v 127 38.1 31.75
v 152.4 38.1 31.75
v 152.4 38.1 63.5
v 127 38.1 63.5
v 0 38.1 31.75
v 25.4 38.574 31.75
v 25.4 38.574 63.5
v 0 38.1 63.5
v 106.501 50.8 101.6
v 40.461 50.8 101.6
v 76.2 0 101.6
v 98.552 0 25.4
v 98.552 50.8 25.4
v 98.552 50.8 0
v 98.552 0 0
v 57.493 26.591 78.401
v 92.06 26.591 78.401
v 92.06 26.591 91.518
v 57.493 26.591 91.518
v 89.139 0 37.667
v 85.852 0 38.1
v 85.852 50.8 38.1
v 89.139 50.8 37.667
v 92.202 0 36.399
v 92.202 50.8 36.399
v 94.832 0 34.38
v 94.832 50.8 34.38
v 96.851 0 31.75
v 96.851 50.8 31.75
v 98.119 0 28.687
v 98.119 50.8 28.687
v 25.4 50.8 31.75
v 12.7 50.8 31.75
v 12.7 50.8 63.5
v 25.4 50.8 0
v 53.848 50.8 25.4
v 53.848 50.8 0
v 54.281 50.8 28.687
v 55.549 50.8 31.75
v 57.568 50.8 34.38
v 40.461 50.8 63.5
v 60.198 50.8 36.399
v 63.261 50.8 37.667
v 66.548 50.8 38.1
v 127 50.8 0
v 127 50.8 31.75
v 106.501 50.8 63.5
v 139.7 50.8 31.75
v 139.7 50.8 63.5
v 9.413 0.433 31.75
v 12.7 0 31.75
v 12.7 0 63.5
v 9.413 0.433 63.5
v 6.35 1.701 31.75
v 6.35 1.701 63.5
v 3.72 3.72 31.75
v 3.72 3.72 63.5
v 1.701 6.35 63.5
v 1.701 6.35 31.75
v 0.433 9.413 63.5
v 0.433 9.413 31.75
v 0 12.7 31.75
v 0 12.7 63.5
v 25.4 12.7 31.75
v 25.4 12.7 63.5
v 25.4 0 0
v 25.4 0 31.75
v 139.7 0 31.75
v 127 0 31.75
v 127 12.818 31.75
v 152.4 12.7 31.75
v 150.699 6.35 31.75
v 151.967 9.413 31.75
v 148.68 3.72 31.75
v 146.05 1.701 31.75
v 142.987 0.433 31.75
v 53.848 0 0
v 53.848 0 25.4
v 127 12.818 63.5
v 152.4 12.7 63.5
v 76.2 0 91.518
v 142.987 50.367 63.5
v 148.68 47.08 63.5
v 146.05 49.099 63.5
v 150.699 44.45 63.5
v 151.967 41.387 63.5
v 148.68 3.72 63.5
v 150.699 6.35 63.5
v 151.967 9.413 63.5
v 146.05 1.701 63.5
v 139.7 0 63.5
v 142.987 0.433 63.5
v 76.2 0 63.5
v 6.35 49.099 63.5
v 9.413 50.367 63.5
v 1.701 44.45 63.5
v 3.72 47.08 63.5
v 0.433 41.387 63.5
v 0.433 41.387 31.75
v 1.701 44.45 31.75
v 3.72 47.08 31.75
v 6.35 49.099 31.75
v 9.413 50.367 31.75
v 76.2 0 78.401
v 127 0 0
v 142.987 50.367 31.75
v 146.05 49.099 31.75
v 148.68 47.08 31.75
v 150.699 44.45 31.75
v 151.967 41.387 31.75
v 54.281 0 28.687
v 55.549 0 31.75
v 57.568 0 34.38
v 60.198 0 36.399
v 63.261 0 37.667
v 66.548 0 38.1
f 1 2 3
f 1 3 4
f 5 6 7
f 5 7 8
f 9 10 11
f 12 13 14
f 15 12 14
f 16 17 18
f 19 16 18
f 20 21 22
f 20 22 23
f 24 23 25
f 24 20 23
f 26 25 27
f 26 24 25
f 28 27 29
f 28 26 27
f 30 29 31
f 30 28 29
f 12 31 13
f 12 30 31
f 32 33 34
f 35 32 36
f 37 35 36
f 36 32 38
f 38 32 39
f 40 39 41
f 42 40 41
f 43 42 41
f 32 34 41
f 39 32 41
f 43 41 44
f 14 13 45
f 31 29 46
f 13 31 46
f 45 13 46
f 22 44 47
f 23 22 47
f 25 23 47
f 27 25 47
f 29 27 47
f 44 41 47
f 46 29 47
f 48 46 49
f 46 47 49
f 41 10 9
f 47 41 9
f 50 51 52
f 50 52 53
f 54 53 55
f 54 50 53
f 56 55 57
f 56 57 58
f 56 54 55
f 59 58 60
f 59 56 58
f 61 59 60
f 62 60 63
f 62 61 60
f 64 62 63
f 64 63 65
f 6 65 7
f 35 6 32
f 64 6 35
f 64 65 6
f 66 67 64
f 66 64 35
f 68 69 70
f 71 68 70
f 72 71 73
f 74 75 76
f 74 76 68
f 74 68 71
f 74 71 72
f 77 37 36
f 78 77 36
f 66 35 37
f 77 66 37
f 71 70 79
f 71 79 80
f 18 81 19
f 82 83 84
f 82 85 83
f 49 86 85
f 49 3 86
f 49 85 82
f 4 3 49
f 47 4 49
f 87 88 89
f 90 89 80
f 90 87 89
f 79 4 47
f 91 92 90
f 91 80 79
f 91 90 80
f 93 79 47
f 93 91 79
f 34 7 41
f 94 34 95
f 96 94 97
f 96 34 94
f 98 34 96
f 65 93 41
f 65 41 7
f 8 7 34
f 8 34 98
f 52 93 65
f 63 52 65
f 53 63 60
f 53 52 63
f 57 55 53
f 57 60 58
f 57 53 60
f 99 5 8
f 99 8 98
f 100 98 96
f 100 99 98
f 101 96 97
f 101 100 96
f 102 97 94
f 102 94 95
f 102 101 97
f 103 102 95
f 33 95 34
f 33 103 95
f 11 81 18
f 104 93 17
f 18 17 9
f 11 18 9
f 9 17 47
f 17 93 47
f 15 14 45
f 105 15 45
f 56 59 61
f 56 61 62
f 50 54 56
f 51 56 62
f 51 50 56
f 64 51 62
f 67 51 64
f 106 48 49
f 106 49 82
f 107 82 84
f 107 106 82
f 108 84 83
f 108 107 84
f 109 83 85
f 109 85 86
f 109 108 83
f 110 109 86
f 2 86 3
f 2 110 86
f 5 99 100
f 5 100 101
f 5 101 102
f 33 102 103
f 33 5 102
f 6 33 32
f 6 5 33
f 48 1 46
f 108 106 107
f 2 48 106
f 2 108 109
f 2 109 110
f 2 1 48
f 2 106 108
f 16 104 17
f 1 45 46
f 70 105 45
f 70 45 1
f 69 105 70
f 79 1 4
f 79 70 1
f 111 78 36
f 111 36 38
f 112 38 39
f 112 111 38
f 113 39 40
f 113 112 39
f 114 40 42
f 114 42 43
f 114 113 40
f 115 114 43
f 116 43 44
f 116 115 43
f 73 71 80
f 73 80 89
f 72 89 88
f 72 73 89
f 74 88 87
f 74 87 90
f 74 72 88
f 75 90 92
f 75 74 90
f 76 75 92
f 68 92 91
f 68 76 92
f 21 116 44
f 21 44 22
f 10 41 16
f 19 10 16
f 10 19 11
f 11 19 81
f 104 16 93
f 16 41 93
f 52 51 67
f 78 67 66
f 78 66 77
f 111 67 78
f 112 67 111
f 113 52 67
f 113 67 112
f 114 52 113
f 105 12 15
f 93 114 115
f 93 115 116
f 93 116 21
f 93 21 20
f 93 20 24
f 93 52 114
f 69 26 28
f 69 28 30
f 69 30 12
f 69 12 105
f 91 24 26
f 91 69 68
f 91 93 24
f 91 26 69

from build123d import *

# Parameters (mm, degrees)
F2_DEPTH = 50.8
F3_DEPTH = 63.5
F5_START = 38.1
F5_DEPTH = 63.5
F6_W     = 26.5905056149
F6_H     = 13.1163969636
F7_DEPTH = 152.401


with BuildPart() as f2:
    # F0 (on Front) → F2 (new body)
    with BuildSketch(Plane.XZ):
        with BuildLine():
            Line((25.4, 31.75), (25.4, 0))
            Line((25.4, 0), (53.848, 0))
            Line((53.848, 0), (53.848, 25.4))
            ThreePointArc((53.848, 25.4), (57.5677438789, 34.3802561211), (66.548, 38.1))
            Line((66.548, 38.1), (85.852, 38.1))
            ThreePointArc((85.852, 38.1), (94.8322561211, 34.3802561211), (98.552, 25.4))
            Line((98.552, 25.4), (98.552, 0))
            Line((98.552, 0), (127, 0))
            Line((127, 0), (127, 31.75))
            Line((127, 31.75), (152.4, 31.75))
            Line((152.4, 31.75), (152.4, 63.5))
            Line((152.4, 63.5), (127, 63.5))
            Line((127, 63.5), (88.9, 63.5))
            Line((88.9, 63.5), (63.5, 63.5))
            Line((63.5, 63.5), (38.1, 63.5))
            Line((38.1, 63.5), (25.4, 63.5))
            Line((25.4, 63.5), (0, 63.5))
            Line((0, 63.5), (0, 31.75))
            Line((0, 31.75), (25.4, 31.75))
        make_face()
    extrude(amount=-F2_DEPTH)

    # F1 (on Top) → F3 (cut)
    with BuildSketch(Plane.XY):
        with BuildLine():
            Line((0, 50.8), (0, 38.1))
            ThreePointArc((0, 38.1), (3.7197438789, 47.0802561211), (12.7, 50.8))
            Line((12.7, 50.8), (0, 50.8))
        make_face()
        with BuildLine():
            ThreePointArc((12.7, 0), (3.7197438789, 3.7197438789), (0, 12.7))
            Line((0, 12.7), (0, 0))
            Line((0, 0), (12.7, 0))
        make_face()
        Polygon((0, 38.1), (0, 12.7), (25.4, 12.7), (25.4, 38.5738648474), align=None)
        Polygon((127, 12.8180403262), (152.4, 12.7), (152.4, 38.1), (127, 38.1), align=None)
        with BuildLine():
            Line((152.4, 0), (152.4, 12.7))
            ThreePointArc((152.4, 12.7), (148.6802561211, 3.7197438789), (139.7, 0))
            Line((139.7, 0), (152.4, 0))
        make_face()
        with BuildLine():
            ThreePointArc((139.7, 50.8), (148.6802561211, 47.0802561211), (152.4, 38.1))
            Line((152.4, 38.1), (152.4, 50.8))
            Line((152.4, 50.8), (139.7, 50.8))
        make_face()
    extrude(amount=F3_DEPTH, mode=Mode.SUBTRACT)

    # F4 (on Top) → F5 (join)
    with BuildSketch(Plane.XY.offset(F5_START)):
        Polygon((40.4607152585, 50.8), (76.2, 0), (106.5007152585, 50.8), align=None)
    extrude(amount=F5_DEPTH)

    # F6 (on Right) → F7 (cut, through all)
    with BuildSketch(Plane.YZ):
        with Locations((13.2952528074, 84.9594064057)):
            Rectangle(F6_W, F6_H)
    extrude(amount=F7_DEPTH, mode=Mode.SUBTRACT)


solid = f2.part
